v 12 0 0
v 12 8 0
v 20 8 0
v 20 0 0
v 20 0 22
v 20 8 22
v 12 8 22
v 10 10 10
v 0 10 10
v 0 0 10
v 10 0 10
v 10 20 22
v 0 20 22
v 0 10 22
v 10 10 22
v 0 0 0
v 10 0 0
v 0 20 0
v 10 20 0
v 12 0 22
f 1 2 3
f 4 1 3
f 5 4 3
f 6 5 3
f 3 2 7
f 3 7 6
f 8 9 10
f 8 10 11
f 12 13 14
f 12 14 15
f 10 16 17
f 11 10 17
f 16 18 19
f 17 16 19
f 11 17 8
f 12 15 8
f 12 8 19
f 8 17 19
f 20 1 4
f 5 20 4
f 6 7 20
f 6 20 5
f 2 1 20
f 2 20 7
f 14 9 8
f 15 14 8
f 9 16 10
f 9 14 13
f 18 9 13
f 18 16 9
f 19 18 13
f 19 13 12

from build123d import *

# Parameters (mm, degrees)
SKETCH1_W           = 10
SKETCH1_H           = 20
BOSS_EXTRUDE1_DEPTH = 10
SKETCH2_W           = 10
SKETCH2_H           = 10
BOSS_EXTRUDE2_DEPTH = 22
SKETCH3_W           = 8
SKETCH3_H           = 8
BOSS_EXTRUDE3_DEPTH = 22


with BuildPart() as part:
    # Sketch1 → Boss-Extrude1 (new body)
    with BuildSketch(Plane.XY):
        with Locations((5, 10)):
            Rectangle(SKETCH1_W, SKETCH1_H)
    extrude(amount=BOSS_EXTRUDE1_DEPTH)

    # Sketch2 → Boss-Extrude2 (add)
    with BuildSketch(Plane.XY):
        with Locations((5, 15)):
            Rectangle(SKETCH2_W, SKETCH2_H)
    extrude(amount=BOSS_EXTRUDE2_DEPTH)


with BuildPart() as body_2:
    # Sketch3 → Boss-Extrude3 (new body)
    with BuildSketch(Plane.XY):
        with Locations((16, 4)):
            Rectangle(SKETCH3_W, SKETCH3_H)
    extrude(amount=BOSS_EXTRUDE3_DEPTH)


solid = Compound([part.part, body_2.part])
